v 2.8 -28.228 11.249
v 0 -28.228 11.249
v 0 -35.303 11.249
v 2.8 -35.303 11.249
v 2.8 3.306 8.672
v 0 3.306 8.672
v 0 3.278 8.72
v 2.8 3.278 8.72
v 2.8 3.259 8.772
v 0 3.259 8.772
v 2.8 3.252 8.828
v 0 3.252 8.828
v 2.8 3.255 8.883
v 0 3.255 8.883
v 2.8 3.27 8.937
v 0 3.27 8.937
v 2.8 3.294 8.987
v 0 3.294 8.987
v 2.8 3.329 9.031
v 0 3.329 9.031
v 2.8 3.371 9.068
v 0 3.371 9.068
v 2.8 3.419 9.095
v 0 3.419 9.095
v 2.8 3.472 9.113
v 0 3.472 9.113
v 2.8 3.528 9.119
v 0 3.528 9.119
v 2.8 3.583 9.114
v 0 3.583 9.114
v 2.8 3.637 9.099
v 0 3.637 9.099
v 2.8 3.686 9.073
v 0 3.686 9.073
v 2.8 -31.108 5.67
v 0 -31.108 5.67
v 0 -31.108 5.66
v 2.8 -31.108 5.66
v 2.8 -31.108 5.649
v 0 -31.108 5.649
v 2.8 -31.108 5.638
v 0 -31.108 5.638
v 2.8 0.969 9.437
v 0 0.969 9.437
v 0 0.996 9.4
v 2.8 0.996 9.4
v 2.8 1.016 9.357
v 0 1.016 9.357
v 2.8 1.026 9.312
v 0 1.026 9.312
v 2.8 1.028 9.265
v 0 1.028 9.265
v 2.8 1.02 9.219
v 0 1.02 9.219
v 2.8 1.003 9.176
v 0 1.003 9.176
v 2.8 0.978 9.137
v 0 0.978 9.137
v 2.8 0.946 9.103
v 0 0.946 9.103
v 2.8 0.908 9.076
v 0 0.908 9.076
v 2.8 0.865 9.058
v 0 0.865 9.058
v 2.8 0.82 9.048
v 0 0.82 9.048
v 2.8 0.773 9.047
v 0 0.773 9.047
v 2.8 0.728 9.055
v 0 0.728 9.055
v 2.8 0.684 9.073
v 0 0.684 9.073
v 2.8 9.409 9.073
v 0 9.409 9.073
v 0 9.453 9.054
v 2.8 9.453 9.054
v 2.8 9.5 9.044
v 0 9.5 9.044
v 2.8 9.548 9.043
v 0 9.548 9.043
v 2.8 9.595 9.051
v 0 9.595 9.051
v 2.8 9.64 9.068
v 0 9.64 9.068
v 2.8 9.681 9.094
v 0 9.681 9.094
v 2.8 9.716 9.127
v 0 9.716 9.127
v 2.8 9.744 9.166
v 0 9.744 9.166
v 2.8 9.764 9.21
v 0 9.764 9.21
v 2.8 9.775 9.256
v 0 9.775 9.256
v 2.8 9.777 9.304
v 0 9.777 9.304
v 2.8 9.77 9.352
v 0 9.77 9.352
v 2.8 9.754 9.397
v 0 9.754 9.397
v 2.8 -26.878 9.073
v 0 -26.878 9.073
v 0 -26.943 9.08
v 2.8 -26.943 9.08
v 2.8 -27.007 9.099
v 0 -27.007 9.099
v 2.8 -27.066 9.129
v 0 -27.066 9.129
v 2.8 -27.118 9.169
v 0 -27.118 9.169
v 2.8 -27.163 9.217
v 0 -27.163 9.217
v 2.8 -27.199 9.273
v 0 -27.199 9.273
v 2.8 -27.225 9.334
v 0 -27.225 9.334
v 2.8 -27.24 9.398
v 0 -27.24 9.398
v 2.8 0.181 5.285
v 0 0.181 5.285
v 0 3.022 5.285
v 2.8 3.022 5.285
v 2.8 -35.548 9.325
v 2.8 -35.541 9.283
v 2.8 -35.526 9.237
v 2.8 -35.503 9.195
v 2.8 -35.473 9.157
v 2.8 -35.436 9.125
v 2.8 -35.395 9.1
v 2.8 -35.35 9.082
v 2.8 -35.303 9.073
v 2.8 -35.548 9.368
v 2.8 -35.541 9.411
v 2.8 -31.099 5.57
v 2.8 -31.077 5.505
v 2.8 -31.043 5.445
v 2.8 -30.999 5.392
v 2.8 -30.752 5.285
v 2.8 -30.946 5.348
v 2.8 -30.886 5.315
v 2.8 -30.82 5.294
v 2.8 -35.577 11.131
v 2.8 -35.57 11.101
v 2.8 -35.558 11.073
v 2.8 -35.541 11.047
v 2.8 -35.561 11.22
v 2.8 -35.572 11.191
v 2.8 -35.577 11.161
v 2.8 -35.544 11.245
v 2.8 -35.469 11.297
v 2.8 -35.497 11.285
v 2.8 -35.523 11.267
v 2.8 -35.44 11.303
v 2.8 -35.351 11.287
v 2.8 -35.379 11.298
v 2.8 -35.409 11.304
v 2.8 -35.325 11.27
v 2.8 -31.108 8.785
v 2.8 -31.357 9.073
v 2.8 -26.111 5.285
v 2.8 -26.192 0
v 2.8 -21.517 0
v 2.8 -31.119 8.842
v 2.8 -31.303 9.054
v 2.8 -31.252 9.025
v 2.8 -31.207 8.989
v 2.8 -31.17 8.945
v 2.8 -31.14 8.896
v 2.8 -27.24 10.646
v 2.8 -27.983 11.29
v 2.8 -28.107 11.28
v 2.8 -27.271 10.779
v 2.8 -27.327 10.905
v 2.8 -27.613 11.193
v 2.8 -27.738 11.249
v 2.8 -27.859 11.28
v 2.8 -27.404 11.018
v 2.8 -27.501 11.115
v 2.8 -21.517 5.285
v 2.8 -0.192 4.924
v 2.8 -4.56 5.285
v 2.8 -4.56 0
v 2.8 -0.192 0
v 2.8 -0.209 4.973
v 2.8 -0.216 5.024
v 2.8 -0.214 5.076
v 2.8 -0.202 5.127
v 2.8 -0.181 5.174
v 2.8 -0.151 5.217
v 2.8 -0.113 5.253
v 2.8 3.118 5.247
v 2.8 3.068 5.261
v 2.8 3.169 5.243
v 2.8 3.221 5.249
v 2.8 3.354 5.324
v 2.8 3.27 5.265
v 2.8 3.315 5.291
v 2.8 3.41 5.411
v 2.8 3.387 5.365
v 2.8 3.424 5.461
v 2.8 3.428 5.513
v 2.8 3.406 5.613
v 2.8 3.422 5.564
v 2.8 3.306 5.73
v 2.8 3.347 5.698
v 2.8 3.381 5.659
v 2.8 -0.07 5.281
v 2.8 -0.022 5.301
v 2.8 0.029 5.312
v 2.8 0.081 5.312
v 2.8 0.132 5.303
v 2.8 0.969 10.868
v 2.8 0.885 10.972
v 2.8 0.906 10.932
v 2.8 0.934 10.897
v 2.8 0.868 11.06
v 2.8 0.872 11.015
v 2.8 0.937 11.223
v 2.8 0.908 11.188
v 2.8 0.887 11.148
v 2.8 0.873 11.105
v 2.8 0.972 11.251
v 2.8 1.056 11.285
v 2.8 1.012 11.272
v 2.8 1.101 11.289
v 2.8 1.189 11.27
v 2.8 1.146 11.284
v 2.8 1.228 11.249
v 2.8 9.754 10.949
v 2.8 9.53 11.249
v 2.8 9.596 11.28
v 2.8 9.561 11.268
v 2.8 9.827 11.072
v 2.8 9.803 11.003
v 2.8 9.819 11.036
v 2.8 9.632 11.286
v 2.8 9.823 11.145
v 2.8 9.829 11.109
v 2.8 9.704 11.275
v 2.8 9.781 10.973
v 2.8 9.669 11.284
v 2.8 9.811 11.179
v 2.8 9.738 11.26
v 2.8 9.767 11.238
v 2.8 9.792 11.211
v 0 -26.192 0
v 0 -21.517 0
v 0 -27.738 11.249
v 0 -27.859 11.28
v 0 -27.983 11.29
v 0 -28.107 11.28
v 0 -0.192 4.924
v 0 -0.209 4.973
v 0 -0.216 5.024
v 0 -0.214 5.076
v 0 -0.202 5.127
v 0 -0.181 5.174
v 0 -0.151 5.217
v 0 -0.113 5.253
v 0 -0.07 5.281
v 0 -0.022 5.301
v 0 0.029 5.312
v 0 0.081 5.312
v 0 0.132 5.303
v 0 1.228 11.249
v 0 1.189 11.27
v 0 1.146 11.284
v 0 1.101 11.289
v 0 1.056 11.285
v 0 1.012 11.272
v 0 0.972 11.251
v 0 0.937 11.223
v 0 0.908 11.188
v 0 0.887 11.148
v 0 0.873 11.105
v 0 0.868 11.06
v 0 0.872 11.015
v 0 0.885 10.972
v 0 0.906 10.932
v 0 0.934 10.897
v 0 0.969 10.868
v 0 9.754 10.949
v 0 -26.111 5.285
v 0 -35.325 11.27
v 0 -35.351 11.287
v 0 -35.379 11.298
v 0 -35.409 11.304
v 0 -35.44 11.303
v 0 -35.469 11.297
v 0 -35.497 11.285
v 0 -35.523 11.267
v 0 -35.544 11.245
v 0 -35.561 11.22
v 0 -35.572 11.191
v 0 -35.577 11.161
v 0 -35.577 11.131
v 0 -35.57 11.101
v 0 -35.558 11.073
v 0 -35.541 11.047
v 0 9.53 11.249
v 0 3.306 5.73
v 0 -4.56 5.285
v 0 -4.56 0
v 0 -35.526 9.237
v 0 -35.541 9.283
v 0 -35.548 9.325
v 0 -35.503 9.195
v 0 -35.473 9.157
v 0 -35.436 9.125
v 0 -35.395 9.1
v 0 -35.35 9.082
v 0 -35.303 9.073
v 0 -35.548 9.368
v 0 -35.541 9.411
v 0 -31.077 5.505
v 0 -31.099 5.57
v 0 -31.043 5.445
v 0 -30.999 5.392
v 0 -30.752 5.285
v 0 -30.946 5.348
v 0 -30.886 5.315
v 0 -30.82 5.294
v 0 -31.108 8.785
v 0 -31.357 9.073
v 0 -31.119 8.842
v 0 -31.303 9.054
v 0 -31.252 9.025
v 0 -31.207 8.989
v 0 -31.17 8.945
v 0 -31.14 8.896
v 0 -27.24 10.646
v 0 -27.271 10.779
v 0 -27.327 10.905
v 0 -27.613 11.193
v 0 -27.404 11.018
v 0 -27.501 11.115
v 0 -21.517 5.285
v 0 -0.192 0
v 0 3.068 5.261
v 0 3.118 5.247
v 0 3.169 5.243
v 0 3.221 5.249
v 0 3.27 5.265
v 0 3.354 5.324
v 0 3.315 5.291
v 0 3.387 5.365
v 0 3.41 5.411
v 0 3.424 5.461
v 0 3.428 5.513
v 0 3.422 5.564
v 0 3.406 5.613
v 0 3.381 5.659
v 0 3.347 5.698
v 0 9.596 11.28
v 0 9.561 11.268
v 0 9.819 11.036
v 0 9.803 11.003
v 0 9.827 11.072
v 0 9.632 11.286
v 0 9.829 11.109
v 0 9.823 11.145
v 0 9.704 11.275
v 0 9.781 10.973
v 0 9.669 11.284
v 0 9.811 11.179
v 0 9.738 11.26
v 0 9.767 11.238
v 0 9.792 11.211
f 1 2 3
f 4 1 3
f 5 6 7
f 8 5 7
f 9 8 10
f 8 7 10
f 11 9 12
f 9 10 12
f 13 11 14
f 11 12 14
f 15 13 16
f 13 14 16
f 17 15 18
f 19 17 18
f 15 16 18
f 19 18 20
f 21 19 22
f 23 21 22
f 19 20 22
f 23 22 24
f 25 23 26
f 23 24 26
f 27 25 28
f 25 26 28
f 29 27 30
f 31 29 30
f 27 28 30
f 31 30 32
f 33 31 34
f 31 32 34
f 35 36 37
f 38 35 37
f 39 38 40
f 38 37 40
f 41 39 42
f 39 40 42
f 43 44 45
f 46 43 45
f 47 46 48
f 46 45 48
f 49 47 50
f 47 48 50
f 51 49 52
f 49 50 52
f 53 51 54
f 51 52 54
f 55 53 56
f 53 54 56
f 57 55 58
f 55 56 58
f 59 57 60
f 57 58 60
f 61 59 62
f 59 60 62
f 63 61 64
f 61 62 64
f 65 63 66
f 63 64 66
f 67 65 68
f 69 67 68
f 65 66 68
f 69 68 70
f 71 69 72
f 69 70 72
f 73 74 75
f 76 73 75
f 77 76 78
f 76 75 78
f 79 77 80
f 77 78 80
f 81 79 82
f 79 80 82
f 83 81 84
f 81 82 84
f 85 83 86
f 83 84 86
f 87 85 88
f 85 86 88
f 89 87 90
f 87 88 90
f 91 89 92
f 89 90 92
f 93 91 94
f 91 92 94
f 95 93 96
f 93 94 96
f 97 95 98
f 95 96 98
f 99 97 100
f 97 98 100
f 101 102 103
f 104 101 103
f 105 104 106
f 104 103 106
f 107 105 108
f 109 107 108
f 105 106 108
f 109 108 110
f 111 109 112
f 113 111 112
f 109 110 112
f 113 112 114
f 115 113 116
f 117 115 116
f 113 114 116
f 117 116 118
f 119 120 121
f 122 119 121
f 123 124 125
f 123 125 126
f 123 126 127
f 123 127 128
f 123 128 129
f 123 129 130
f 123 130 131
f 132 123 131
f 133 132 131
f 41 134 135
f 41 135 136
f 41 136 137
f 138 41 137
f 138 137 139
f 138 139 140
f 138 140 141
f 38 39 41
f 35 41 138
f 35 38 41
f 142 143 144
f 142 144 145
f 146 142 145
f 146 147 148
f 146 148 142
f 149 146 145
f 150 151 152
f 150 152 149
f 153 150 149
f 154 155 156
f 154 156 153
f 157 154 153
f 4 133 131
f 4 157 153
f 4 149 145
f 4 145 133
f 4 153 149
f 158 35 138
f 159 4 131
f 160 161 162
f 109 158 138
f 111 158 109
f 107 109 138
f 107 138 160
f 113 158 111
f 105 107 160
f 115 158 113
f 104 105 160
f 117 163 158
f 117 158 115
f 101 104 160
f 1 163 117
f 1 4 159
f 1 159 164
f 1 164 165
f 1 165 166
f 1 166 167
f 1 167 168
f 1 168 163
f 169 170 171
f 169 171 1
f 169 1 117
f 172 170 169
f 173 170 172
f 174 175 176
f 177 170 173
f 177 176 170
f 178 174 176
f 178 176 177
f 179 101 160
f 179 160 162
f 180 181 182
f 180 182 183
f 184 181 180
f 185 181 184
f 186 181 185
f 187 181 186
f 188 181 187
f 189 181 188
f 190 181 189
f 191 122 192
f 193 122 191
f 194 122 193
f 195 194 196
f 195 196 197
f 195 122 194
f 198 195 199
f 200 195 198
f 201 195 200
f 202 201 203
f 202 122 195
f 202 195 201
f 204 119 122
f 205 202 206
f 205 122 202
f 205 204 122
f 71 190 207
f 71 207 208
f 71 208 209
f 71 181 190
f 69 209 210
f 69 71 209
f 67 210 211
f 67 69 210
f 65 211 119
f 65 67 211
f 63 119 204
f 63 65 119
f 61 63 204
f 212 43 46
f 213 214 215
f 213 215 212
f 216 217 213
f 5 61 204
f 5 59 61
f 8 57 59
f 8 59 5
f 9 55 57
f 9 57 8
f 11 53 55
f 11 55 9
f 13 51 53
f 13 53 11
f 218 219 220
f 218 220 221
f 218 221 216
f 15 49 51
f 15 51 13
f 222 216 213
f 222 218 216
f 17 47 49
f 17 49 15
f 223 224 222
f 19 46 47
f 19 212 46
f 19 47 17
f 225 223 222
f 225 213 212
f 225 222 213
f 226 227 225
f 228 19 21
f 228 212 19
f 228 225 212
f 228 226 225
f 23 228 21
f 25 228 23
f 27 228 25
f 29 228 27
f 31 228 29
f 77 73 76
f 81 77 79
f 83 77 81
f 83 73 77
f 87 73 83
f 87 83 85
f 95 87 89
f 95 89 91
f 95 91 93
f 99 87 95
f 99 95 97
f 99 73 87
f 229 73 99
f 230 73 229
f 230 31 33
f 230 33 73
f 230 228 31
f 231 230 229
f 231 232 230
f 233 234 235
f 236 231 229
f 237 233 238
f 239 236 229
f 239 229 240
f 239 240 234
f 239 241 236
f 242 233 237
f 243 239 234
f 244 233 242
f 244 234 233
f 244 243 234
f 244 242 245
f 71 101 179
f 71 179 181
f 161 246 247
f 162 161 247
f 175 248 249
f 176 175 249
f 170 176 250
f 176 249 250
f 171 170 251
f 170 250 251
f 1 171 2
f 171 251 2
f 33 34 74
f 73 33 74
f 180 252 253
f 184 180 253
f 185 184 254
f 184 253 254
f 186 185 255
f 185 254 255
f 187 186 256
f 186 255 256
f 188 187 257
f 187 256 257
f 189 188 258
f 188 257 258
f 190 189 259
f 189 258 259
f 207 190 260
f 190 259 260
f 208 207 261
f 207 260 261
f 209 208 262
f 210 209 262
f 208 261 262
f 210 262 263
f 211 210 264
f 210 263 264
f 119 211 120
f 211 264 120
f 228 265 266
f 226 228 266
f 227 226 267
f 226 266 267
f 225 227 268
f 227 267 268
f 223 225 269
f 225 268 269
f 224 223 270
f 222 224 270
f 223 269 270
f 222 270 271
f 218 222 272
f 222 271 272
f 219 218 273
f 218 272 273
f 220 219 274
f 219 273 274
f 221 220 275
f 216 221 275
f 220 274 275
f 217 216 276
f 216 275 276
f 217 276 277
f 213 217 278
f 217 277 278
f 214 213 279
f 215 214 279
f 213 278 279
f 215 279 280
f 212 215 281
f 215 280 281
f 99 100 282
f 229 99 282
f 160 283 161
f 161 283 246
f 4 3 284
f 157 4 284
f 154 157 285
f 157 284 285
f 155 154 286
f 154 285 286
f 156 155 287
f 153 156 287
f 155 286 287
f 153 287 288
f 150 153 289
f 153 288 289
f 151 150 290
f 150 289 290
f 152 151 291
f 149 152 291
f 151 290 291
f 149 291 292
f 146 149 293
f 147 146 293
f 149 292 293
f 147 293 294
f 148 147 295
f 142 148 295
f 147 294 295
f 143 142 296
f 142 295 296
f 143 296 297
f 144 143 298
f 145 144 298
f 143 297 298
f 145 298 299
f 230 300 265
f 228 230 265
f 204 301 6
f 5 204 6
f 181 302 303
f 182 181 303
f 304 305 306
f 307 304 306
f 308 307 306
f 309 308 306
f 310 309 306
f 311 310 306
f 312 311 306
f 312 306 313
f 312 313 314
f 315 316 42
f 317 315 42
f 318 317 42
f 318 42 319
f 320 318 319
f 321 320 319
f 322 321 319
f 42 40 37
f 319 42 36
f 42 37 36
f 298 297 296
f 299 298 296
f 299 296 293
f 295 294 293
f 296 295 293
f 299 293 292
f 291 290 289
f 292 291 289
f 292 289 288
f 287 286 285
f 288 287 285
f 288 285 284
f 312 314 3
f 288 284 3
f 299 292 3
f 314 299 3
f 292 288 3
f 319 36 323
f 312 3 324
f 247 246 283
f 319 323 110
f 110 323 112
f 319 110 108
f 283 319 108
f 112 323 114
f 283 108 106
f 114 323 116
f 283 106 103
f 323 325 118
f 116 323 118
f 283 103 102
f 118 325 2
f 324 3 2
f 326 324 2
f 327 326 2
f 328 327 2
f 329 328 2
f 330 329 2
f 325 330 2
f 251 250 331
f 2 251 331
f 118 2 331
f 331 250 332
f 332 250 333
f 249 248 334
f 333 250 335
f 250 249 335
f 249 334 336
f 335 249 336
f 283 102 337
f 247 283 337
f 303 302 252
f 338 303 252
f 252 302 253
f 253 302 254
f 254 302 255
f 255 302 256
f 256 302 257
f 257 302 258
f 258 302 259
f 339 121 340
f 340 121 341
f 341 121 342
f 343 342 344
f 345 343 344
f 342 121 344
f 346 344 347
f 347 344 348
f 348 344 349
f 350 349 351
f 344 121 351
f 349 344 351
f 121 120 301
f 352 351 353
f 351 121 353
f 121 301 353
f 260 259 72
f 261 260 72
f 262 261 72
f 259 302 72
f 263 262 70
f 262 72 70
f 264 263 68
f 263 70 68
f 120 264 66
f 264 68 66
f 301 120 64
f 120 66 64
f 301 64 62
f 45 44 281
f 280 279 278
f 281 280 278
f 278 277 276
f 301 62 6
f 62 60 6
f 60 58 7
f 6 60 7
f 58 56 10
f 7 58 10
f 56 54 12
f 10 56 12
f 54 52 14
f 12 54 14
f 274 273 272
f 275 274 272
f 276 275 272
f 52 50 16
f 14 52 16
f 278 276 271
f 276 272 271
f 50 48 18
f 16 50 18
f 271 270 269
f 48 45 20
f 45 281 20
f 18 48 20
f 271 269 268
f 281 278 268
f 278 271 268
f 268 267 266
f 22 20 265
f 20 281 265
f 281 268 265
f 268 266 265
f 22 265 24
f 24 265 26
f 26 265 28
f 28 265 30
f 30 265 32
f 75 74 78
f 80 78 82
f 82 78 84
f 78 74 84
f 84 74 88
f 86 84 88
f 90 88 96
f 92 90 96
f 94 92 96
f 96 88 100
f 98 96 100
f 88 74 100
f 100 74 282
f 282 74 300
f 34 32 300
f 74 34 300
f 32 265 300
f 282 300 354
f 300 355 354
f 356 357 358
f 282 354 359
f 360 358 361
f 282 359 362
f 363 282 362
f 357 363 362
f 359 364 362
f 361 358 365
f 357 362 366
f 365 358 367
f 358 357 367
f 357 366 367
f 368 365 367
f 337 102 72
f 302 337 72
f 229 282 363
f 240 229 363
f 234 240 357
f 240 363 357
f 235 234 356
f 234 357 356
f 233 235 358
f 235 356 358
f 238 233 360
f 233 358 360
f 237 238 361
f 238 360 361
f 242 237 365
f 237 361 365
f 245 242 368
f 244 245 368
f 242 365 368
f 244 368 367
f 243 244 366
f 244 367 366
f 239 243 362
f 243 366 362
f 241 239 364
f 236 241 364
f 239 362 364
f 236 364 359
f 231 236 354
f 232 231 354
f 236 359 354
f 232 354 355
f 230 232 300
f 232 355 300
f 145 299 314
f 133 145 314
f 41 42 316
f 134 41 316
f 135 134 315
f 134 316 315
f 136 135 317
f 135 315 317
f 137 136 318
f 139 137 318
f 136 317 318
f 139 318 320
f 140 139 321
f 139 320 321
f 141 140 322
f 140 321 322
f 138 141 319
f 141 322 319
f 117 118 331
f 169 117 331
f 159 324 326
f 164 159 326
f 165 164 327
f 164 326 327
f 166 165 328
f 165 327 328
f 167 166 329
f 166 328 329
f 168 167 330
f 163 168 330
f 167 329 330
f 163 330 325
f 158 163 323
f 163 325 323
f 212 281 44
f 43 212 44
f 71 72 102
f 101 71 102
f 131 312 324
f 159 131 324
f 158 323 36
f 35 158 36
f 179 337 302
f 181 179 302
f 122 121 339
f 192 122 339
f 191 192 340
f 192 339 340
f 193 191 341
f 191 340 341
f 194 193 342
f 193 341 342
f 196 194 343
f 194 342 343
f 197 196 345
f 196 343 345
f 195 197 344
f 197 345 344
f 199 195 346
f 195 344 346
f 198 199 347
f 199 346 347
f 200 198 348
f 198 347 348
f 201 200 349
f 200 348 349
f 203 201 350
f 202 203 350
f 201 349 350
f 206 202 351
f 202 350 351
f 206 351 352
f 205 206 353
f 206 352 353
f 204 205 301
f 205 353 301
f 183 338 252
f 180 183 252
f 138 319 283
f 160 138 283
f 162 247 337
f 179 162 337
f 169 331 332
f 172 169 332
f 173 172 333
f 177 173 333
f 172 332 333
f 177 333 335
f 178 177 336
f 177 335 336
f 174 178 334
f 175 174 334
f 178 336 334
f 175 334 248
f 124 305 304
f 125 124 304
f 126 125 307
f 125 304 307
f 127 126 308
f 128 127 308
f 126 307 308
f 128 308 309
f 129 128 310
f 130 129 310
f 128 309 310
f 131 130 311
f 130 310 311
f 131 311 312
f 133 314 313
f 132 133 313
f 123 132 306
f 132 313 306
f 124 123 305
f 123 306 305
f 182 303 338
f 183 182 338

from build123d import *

# Parameters (mm, degrees)
F1_DEPTH = 2.8


with BuildPart() as f1:
    # F0 (on Right) → F1 (new body)
    with BuildSketch(Plane.YZ):
        with BuildLine():
            Line((-26.111206, 5.284752), (-26.191802, 0))
            Line((-26.191802, 0), (-21.517237, 0))
            Line((-21.517237, 0), (-21.517237, 5.284752))
            Line((-21.517237, 5.284752), (-4.5604, 5.284752))
            Line((-4.5604, 5.284752), (-4.5604, 0))
            Line((-4.5604, 0), (-0.191802, 0))
            Line((-0.191802, 0), (-0.191802, 4.923995))
            ThreePointArc((-0.191802, 4.923995), (-0.132906, 5.235764), (0.180573, 5.284752))
            Line((0.180573, 5.284752), (3.02158, 5.284752))
            ThreePointArc((3.02158, 5.284752), (3.386548, 5.364985), (3.306315, 5.729954))
            Line((3.306315, 5.729954), (3.306315, 8.671706))
            ThreePointArc((3.306315, 8.671706), (3.3285, 9.0314), (3.686496, 9.072762))
            Line((3.686496, 9.072762), (9.408809, 9.072762))
            ThreePointArc((9.408809, 9.072762), (9.699169, 9.109567), (9.753991, 9.39707))
            Line((9.753991, 9.39707), (9.753991, 10.948542))
            ThreePointArc((9.753991, 10.948542), (9.792001, 11.210841), (9.529702, 11.248852))
            Line((9.529702, 11.248852), (2.258568, 11.248852))
            Line((2.258568, 11.248852), (1.22832, 11.248852))
            ThreePointArc((1.22832, 11.248852), (0.908223, 11.188042), (0.969033, 10.867945))
            Line((0.969033, 10.867945), (0.969033, 9.437368))
            ThreePointArc((0.969033, 9.437368), (0.978366, 9.136595), (0.684297, 9.072762))
            Line((0.684297, 9.072762), (-26.857296, 9.072762))
            ThreePointArc((-26.857296, 9.072762), (-26.867436, 9.072625), (-26.877575, 9.072762))
            ThreePointArc((-26.877575, 9.072762), (-27.118402, 9.168825), (-27.239549, 9.398061))
            ThreePointArc((-27.239549, 9.398061), (-27.242897, 9.448086), (-27.239549, 9.498111))
            Line((-27.239549, 9.498111), (-27.239549, 10.646189))
            ThreePointArc((-27.239549, 10.646189), (-27.404115, 11.017522), (-27.737966, 11.248852))
            Line((-27.737966, 11.248852), (-28.227659, 11.248852))
            Line((-28.227659, 11.248852), (-35.302914, 11.248852))
            ThreePointArc((-35.302914, 11.248852), (-35.522633, 11.267151), (-35.540933, 11.047432))
            Line((-35.540933, 11.047432), (-35.540933, 9.410823))
            Line((-35.540933, 9.410823), (-35.540933, 9.282929))
            ThreePointArc((-35.540933, 9.282929), (-35.455206, 9.140153), (-35.302914, 9.072762))
            Line((-35.302914, 9.072762), (-31.523069, 9.072762))
            ThreePointArc((-31.523069, 9.072762), (-31.44012, 9.083231), (-31.357172, 9.072762))
            ThreePointArc((-31.357172, 9.072762), (-31.187614, 8.967777), (-31.108157, 8.784861))
            ThreePointArc((-31.108157, 8.784861), (-31.106266, 8.749376), (-31.108157, 8.713891))
            Line((-31.108157, 8.713891), (-31.108157, 5.670374))
            Line((-31.108157, 5.670374), (-31.108157, 5.63826))
            ThreePointArc((-31.108157, 5.63826), (-30.999114, 5.391756), (-30.75172, 5.284752))
            Line((-30.75172, 5.284752), (-26.111206, 5.284752))
        make_face()
        with BuildLine():
            ThreePointArc((-31.108157, 5.670374), (-31.108506, 5.654317), (-31.108157, 5.63826))
            Line((-31.108157, 5.63826), (-31.108157, 5.670374))
        make_face()
        with BuildLine():
            Line((-31.108157, 8.784861), (-31.108157, 8.713891))
            ThreePointArc((-31.108157, 8.713891), (-31.106266, 8.749376), (-31.108157, 8.784861))
        make_face()
        with BuildLine():
            Line((-31.523069, 9.072762), (-31.357172, 9.072762))
            ThreePointArc((-31.357172, 9.072762), (-31.44012, 9.083231), (-31.523069, 9.072762))
        make_face()
        with BuildLine():
            ThreePointArc((-35.540933, 9.410823), (-35.548449, 9.346876), (-35.540933, 9.282929))
            Line((-35.540933, 9.282929), (-35.540933, 9.410823))
        make_face()
        with BuildLine():
            ThreePointArc((-27.737966, 11.248852), (-27.982812, 11.289888), (-28.227659, 11.248852))
            Line((-28.227659, 11.248852), (-27.737966, 11.248852))
        make_face()
        with BuildLine():
            Line((-27.239549, 9.398061), (-27.239549, 9.498111))
            ThreePointArc((-27.239549, 9.498111), (-27.242897, 9.448086), (-27.239549, 9.398061))
        make_face()
        with BuildLine():
            Line((-26.857296, 9.072762), (-26.877575, 9.072762))
            ThreePointArc((-26.877575, 9.072762), (-26.867436, 9.072625), (-26.857296, 9.072762))
        make_face()
    extrude(amount=F1_DEPTH)


solid = f1.part
